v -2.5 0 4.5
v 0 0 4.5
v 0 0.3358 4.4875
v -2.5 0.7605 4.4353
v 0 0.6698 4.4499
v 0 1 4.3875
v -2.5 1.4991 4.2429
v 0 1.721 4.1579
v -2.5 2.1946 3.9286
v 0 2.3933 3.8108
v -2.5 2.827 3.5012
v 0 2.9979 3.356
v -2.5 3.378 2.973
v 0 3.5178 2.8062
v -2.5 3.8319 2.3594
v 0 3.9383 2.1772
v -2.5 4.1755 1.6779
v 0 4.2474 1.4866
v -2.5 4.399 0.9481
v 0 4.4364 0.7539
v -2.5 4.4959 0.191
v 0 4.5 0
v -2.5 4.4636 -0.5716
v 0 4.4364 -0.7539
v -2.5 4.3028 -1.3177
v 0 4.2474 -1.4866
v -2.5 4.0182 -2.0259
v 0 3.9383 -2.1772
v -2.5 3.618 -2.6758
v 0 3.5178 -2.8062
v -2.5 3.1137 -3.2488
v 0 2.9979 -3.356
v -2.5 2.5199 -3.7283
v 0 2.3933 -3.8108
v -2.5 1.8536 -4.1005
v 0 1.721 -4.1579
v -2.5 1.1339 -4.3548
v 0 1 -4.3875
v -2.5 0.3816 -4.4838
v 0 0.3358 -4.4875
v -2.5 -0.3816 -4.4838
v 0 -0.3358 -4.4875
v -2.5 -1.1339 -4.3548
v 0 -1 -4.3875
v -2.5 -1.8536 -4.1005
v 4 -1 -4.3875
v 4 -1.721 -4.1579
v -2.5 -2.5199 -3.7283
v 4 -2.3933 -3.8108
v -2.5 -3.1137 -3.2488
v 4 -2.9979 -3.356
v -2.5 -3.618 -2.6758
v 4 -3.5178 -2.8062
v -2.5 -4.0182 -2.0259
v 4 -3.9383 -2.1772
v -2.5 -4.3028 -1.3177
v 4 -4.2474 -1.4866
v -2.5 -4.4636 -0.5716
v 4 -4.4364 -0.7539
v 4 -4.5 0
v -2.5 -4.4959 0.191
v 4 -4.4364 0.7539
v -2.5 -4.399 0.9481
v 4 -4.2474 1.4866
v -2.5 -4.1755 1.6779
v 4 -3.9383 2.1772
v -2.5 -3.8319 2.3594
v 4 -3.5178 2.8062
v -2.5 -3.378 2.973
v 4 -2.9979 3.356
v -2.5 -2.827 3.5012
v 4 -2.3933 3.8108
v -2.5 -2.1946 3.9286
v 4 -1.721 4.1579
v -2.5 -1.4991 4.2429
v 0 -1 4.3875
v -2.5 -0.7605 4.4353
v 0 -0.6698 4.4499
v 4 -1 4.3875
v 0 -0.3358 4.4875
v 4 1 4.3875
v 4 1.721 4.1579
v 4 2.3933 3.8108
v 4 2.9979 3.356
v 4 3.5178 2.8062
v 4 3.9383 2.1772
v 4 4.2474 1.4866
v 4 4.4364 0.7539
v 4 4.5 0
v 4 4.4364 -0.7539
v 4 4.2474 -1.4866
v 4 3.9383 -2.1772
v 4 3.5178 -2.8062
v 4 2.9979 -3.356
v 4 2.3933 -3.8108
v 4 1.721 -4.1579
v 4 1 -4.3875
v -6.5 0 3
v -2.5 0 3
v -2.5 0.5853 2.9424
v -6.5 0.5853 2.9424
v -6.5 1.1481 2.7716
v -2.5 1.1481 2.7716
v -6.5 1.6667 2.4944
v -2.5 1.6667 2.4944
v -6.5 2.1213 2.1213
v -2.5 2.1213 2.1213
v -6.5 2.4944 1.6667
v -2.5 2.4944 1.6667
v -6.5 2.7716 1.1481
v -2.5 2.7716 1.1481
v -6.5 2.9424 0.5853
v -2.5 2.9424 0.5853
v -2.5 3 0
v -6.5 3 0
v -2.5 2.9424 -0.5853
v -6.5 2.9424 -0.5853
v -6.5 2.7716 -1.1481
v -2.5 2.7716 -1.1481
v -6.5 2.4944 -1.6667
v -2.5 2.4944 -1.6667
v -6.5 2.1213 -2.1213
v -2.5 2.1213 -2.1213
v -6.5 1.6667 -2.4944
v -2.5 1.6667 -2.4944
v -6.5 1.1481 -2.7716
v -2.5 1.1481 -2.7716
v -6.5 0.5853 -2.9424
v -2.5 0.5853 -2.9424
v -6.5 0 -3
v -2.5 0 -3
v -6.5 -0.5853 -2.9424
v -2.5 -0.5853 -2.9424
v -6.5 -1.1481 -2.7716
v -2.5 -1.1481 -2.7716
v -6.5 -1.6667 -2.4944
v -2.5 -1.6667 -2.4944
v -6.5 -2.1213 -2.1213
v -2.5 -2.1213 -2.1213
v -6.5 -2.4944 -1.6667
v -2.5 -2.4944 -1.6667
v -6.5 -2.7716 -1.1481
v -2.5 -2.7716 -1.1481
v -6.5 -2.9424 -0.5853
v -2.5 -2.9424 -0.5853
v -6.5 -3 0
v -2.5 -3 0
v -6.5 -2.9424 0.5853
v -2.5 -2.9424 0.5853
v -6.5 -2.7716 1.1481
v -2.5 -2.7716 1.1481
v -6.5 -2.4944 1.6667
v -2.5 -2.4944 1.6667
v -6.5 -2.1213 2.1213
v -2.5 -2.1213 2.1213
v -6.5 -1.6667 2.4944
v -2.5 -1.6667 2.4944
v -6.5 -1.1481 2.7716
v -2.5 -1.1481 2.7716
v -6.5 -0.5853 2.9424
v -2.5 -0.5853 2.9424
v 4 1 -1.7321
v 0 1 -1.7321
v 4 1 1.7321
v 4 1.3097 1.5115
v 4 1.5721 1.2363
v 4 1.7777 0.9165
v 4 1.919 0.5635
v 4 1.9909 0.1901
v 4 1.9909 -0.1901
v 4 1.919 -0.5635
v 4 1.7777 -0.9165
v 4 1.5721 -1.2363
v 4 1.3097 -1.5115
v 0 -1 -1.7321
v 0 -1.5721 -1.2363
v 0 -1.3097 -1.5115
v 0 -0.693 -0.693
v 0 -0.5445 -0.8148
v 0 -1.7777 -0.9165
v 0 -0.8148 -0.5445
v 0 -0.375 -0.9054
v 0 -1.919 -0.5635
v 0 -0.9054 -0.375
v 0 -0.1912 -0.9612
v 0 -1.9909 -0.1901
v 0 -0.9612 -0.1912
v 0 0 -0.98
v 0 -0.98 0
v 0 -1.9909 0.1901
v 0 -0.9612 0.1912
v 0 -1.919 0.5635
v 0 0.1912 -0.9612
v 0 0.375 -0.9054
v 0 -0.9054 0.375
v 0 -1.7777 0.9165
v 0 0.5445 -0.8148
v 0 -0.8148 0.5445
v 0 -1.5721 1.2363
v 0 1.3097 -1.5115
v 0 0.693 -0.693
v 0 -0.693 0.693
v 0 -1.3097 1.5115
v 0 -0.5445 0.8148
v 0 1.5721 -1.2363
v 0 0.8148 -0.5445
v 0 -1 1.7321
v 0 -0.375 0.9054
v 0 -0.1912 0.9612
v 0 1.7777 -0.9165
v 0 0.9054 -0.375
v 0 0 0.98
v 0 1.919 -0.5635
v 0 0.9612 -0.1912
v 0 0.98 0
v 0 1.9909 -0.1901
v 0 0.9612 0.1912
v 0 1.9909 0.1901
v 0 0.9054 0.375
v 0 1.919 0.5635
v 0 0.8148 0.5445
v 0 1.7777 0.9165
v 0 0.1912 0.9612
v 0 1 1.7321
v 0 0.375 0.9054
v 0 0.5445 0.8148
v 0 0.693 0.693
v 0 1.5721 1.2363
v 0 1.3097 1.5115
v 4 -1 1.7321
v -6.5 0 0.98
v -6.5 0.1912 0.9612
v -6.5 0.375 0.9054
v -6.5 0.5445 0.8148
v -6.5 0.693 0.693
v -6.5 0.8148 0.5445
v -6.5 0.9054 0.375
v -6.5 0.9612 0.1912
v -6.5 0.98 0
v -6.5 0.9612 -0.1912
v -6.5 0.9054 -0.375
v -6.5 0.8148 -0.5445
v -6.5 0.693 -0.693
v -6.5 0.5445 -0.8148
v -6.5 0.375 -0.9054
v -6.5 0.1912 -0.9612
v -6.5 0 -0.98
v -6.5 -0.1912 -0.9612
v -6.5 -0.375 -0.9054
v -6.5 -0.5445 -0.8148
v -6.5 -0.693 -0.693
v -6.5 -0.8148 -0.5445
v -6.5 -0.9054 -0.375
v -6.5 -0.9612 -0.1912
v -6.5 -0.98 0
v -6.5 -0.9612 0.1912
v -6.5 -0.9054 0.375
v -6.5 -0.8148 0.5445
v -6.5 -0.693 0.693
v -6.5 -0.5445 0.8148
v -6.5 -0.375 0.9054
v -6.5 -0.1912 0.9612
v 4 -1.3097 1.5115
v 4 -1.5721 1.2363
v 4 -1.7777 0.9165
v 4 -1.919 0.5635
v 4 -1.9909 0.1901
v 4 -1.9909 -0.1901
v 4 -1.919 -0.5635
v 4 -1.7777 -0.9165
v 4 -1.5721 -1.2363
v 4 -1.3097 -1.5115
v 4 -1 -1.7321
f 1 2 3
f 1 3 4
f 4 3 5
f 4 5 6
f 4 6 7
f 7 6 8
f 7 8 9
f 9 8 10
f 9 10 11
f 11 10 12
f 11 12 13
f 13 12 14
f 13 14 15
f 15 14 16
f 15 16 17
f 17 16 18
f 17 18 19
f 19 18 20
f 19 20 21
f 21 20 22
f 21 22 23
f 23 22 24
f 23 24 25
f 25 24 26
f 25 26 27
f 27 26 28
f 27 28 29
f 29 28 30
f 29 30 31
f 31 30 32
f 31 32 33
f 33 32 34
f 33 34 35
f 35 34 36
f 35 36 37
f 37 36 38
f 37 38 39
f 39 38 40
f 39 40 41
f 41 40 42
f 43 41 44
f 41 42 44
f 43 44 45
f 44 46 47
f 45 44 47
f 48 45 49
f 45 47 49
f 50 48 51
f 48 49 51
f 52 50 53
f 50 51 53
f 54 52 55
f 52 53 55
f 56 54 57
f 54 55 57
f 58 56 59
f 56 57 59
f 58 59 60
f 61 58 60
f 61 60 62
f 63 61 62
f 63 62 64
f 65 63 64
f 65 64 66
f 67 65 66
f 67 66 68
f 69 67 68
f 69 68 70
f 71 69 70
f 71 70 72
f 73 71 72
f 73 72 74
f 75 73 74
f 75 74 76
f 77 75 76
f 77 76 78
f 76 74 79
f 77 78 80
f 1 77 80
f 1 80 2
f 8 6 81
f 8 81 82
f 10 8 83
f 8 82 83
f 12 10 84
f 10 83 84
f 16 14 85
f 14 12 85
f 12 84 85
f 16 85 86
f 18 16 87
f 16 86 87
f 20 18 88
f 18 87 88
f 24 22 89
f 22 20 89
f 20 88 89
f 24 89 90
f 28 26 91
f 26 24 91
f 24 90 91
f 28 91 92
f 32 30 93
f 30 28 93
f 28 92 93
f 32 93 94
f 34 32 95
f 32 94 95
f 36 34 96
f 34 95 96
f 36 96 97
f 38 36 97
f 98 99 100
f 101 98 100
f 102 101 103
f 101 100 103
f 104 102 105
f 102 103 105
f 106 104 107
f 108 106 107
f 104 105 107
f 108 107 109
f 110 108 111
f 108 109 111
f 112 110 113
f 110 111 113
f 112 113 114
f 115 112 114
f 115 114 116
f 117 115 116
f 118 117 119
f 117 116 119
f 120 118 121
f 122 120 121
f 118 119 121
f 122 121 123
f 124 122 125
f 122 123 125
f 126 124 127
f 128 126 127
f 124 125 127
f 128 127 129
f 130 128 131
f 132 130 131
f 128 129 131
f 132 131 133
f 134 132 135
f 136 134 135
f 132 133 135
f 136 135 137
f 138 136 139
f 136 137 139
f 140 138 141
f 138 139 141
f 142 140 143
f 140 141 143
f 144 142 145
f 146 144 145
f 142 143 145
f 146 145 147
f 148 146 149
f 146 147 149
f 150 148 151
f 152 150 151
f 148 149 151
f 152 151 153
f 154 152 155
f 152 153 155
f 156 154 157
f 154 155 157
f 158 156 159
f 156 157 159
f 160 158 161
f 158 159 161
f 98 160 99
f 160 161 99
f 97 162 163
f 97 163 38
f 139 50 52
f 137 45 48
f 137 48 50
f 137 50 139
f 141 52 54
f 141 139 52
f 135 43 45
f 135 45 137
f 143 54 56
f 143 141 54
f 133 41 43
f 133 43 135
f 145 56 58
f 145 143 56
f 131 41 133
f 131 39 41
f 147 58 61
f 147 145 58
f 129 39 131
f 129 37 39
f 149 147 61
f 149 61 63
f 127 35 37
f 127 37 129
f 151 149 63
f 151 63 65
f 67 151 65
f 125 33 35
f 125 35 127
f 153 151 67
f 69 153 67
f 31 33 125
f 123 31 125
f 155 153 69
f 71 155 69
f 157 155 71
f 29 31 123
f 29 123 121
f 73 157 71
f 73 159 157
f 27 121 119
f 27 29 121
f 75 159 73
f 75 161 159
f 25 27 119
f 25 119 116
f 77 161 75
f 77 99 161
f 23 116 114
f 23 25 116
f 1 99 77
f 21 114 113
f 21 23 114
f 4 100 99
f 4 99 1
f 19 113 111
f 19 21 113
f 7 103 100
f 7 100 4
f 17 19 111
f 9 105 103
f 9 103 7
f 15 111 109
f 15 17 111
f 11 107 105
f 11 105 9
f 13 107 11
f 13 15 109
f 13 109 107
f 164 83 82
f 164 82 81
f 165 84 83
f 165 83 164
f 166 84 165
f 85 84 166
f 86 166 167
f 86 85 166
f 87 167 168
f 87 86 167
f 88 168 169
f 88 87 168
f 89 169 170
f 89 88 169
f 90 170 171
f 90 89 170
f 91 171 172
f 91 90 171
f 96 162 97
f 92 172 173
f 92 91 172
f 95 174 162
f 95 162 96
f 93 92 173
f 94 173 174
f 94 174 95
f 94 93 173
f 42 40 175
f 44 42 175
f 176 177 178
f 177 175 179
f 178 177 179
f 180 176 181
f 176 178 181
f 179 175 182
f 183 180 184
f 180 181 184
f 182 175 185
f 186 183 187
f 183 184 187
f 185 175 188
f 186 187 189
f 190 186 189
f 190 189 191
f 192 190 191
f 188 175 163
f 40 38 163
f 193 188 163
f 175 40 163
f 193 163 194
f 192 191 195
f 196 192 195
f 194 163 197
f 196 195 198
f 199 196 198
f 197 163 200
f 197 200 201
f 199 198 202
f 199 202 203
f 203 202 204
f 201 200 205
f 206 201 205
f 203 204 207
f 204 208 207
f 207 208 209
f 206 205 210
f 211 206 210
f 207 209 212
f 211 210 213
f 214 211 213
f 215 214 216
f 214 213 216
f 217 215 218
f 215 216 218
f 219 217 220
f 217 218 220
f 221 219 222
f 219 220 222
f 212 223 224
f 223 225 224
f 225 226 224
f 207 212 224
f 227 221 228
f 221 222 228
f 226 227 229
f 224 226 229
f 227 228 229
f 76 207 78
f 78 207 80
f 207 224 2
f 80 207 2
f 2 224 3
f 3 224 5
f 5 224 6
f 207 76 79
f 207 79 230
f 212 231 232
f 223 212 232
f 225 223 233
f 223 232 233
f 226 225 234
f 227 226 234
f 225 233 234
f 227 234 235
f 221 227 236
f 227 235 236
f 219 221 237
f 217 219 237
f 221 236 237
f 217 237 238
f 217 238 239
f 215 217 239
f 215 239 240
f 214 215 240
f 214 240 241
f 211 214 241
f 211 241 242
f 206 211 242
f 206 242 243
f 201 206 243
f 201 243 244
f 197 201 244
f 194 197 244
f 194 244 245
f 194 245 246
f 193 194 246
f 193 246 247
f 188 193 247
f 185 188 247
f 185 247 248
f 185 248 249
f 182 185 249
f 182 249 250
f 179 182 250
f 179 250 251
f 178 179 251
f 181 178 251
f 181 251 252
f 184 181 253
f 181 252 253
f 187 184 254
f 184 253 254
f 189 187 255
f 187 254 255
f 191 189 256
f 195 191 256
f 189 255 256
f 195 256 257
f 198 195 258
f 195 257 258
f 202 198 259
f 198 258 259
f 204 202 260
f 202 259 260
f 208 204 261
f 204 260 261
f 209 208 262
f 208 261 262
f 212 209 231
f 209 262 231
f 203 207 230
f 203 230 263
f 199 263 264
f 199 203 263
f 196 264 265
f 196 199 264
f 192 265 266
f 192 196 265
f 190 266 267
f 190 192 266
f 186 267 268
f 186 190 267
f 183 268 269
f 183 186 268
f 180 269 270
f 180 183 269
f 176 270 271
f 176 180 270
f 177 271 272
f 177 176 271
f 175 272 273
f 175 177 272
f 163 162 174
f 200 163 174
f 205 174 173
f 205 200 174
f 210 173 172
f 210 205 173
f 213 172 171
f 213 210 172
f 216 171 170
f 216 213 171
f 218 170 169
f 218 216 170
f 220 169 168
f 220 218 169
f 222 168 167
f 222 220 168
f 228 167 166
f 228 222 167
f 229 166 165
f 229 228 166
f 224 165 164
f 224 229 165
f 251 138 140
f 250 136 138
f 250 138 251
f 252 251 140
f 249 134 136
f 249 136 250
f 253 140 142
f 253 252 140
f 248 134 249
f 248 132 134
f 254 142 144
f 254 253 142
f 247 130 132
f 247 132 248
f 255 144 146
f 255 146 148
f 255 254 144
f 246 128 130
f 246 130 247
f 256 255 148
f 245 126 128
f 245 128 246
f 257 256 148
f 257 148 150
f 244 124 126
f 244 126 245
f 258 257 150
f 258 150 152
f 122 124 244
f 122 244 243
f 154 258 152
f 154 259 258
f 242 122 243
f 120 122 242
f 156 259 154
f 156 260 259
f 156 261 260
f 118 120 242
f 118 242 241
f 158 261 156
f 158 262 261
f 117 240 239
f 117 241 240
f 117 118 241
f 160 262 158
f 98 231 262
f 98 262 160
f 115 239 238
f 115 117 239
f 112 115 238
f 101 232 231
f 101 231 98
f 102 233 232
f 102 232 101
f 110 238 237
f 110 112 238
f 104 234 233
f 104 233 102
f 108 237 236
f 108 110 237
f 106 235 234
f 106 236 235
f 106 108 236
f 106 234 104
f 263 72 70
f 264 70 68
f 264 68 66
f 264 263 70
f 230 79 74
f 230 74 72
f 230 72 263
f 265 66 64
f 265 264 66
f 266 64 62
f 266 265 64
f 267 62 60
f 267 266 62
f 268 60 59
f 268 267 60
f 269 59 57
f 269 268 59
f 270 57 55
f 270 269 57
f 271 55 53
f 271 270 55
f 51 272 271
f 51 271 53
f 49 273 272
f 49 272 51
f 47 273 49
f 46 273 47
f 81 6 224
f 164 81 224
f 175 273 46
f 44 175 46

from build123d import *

# Parameters (mm, degrees)
SKETCH_1_R          = 4.5
SKETCH_1_R_2        = 2
EXTRUDE_1_DEPTH     = 4
SKETCH_2_W          = 10.852293239
SKETCH_2_H          = 2
CUT_EXTRUDE_1_DEPTH = 4
SKETCH_5_R          = 4.5
EXTRUDE_3_DEPTH     = 2.5
SKETCH_6_R          = 3
EXTRUDE_4_DEPTH     = 4
SKETCH_7_R          = 0.98
CUT_EXTRUDE_2_DEPTH = 13.278029158


with BuildPart() as part:
    # 草图1 → 凸台-拉伸1 (new body)
    with BuildSketch(Plane(origin=(0, 0, 0), x_dir=(0, 0, -1), z_dir=(1, 0, 0))):
        Circle(SKETCH_1_R)
        Circle(SKETCH_1_R_2, mode=Mode.SUBTRACT)
    extrude(amount=EXTRUDE_1_DEPTH)

    # 草图2 → 切除-拉伸1 (cut)
    with BuildSketch(Plane(origin=(4, 0, 0), x_dir=(0, 0, -1), z_dir=(1, 0, 0))):
        with Locations((-0.118295573, 0)):
            Rectangle(SKETCH_2_W, SKETCH_2_H)
    extrude(amount=-CUT_EXTRUDE_1_DEPTH, mode=Mode.SUBTRACT)


with BuildPart() as cut_extrude_1_piece_1:
    # of the separate pieces the step leaves, piece 1, a body of its own (cut_extrude_1_pieces)
    add(part.part.solids().sort_by_distance((0, 1, -4.387482194))[0])



with BuildPart() as cut_extrude_1_piece_2:
    # of the separate pieces the step leaves, piece 2, a body of its own (cut_extrude_1_pieces)
    add(part.part.solids().sort_by_distance((0, -1, 4.387482194))[0])


with BuildPart() as cut_extrude_1_piece_1_1:
    add(cut_extrude_1_piece_1.part)

    add(cut_extrude_1_piece_2.part)  # 凸台-拉伸3 merges 切除-拉伸1 piece 2
    # 草图5 → 凸台-拉伸3 (add)
    with BuildSketch(Plane.ZY):
        Circle(SKETCH_5_R)
    extrude(amount=EXTRUDE_3_DEPTH)

    # 草图6 → 凸台-拉伸4 (add)
    with BuildSketch(Plane.ZY.offset(2.5)):
        Circle(SKETCH_6_R)
    extrude(amount=EXTRUDE_4_DEPTH)

    # 草图7 → 切除-拉伸2 (cut, through all)
    with BuildSketch(Plane.ZY.offset(6.5)):
        Circle(SKETCH_7_R)
    extrude(amount=-CUT_EXTRUDE_2_DEPTH, mode=Mode.SUBTRACT)


solid = cut_extrude_1_piece_1_1.part
